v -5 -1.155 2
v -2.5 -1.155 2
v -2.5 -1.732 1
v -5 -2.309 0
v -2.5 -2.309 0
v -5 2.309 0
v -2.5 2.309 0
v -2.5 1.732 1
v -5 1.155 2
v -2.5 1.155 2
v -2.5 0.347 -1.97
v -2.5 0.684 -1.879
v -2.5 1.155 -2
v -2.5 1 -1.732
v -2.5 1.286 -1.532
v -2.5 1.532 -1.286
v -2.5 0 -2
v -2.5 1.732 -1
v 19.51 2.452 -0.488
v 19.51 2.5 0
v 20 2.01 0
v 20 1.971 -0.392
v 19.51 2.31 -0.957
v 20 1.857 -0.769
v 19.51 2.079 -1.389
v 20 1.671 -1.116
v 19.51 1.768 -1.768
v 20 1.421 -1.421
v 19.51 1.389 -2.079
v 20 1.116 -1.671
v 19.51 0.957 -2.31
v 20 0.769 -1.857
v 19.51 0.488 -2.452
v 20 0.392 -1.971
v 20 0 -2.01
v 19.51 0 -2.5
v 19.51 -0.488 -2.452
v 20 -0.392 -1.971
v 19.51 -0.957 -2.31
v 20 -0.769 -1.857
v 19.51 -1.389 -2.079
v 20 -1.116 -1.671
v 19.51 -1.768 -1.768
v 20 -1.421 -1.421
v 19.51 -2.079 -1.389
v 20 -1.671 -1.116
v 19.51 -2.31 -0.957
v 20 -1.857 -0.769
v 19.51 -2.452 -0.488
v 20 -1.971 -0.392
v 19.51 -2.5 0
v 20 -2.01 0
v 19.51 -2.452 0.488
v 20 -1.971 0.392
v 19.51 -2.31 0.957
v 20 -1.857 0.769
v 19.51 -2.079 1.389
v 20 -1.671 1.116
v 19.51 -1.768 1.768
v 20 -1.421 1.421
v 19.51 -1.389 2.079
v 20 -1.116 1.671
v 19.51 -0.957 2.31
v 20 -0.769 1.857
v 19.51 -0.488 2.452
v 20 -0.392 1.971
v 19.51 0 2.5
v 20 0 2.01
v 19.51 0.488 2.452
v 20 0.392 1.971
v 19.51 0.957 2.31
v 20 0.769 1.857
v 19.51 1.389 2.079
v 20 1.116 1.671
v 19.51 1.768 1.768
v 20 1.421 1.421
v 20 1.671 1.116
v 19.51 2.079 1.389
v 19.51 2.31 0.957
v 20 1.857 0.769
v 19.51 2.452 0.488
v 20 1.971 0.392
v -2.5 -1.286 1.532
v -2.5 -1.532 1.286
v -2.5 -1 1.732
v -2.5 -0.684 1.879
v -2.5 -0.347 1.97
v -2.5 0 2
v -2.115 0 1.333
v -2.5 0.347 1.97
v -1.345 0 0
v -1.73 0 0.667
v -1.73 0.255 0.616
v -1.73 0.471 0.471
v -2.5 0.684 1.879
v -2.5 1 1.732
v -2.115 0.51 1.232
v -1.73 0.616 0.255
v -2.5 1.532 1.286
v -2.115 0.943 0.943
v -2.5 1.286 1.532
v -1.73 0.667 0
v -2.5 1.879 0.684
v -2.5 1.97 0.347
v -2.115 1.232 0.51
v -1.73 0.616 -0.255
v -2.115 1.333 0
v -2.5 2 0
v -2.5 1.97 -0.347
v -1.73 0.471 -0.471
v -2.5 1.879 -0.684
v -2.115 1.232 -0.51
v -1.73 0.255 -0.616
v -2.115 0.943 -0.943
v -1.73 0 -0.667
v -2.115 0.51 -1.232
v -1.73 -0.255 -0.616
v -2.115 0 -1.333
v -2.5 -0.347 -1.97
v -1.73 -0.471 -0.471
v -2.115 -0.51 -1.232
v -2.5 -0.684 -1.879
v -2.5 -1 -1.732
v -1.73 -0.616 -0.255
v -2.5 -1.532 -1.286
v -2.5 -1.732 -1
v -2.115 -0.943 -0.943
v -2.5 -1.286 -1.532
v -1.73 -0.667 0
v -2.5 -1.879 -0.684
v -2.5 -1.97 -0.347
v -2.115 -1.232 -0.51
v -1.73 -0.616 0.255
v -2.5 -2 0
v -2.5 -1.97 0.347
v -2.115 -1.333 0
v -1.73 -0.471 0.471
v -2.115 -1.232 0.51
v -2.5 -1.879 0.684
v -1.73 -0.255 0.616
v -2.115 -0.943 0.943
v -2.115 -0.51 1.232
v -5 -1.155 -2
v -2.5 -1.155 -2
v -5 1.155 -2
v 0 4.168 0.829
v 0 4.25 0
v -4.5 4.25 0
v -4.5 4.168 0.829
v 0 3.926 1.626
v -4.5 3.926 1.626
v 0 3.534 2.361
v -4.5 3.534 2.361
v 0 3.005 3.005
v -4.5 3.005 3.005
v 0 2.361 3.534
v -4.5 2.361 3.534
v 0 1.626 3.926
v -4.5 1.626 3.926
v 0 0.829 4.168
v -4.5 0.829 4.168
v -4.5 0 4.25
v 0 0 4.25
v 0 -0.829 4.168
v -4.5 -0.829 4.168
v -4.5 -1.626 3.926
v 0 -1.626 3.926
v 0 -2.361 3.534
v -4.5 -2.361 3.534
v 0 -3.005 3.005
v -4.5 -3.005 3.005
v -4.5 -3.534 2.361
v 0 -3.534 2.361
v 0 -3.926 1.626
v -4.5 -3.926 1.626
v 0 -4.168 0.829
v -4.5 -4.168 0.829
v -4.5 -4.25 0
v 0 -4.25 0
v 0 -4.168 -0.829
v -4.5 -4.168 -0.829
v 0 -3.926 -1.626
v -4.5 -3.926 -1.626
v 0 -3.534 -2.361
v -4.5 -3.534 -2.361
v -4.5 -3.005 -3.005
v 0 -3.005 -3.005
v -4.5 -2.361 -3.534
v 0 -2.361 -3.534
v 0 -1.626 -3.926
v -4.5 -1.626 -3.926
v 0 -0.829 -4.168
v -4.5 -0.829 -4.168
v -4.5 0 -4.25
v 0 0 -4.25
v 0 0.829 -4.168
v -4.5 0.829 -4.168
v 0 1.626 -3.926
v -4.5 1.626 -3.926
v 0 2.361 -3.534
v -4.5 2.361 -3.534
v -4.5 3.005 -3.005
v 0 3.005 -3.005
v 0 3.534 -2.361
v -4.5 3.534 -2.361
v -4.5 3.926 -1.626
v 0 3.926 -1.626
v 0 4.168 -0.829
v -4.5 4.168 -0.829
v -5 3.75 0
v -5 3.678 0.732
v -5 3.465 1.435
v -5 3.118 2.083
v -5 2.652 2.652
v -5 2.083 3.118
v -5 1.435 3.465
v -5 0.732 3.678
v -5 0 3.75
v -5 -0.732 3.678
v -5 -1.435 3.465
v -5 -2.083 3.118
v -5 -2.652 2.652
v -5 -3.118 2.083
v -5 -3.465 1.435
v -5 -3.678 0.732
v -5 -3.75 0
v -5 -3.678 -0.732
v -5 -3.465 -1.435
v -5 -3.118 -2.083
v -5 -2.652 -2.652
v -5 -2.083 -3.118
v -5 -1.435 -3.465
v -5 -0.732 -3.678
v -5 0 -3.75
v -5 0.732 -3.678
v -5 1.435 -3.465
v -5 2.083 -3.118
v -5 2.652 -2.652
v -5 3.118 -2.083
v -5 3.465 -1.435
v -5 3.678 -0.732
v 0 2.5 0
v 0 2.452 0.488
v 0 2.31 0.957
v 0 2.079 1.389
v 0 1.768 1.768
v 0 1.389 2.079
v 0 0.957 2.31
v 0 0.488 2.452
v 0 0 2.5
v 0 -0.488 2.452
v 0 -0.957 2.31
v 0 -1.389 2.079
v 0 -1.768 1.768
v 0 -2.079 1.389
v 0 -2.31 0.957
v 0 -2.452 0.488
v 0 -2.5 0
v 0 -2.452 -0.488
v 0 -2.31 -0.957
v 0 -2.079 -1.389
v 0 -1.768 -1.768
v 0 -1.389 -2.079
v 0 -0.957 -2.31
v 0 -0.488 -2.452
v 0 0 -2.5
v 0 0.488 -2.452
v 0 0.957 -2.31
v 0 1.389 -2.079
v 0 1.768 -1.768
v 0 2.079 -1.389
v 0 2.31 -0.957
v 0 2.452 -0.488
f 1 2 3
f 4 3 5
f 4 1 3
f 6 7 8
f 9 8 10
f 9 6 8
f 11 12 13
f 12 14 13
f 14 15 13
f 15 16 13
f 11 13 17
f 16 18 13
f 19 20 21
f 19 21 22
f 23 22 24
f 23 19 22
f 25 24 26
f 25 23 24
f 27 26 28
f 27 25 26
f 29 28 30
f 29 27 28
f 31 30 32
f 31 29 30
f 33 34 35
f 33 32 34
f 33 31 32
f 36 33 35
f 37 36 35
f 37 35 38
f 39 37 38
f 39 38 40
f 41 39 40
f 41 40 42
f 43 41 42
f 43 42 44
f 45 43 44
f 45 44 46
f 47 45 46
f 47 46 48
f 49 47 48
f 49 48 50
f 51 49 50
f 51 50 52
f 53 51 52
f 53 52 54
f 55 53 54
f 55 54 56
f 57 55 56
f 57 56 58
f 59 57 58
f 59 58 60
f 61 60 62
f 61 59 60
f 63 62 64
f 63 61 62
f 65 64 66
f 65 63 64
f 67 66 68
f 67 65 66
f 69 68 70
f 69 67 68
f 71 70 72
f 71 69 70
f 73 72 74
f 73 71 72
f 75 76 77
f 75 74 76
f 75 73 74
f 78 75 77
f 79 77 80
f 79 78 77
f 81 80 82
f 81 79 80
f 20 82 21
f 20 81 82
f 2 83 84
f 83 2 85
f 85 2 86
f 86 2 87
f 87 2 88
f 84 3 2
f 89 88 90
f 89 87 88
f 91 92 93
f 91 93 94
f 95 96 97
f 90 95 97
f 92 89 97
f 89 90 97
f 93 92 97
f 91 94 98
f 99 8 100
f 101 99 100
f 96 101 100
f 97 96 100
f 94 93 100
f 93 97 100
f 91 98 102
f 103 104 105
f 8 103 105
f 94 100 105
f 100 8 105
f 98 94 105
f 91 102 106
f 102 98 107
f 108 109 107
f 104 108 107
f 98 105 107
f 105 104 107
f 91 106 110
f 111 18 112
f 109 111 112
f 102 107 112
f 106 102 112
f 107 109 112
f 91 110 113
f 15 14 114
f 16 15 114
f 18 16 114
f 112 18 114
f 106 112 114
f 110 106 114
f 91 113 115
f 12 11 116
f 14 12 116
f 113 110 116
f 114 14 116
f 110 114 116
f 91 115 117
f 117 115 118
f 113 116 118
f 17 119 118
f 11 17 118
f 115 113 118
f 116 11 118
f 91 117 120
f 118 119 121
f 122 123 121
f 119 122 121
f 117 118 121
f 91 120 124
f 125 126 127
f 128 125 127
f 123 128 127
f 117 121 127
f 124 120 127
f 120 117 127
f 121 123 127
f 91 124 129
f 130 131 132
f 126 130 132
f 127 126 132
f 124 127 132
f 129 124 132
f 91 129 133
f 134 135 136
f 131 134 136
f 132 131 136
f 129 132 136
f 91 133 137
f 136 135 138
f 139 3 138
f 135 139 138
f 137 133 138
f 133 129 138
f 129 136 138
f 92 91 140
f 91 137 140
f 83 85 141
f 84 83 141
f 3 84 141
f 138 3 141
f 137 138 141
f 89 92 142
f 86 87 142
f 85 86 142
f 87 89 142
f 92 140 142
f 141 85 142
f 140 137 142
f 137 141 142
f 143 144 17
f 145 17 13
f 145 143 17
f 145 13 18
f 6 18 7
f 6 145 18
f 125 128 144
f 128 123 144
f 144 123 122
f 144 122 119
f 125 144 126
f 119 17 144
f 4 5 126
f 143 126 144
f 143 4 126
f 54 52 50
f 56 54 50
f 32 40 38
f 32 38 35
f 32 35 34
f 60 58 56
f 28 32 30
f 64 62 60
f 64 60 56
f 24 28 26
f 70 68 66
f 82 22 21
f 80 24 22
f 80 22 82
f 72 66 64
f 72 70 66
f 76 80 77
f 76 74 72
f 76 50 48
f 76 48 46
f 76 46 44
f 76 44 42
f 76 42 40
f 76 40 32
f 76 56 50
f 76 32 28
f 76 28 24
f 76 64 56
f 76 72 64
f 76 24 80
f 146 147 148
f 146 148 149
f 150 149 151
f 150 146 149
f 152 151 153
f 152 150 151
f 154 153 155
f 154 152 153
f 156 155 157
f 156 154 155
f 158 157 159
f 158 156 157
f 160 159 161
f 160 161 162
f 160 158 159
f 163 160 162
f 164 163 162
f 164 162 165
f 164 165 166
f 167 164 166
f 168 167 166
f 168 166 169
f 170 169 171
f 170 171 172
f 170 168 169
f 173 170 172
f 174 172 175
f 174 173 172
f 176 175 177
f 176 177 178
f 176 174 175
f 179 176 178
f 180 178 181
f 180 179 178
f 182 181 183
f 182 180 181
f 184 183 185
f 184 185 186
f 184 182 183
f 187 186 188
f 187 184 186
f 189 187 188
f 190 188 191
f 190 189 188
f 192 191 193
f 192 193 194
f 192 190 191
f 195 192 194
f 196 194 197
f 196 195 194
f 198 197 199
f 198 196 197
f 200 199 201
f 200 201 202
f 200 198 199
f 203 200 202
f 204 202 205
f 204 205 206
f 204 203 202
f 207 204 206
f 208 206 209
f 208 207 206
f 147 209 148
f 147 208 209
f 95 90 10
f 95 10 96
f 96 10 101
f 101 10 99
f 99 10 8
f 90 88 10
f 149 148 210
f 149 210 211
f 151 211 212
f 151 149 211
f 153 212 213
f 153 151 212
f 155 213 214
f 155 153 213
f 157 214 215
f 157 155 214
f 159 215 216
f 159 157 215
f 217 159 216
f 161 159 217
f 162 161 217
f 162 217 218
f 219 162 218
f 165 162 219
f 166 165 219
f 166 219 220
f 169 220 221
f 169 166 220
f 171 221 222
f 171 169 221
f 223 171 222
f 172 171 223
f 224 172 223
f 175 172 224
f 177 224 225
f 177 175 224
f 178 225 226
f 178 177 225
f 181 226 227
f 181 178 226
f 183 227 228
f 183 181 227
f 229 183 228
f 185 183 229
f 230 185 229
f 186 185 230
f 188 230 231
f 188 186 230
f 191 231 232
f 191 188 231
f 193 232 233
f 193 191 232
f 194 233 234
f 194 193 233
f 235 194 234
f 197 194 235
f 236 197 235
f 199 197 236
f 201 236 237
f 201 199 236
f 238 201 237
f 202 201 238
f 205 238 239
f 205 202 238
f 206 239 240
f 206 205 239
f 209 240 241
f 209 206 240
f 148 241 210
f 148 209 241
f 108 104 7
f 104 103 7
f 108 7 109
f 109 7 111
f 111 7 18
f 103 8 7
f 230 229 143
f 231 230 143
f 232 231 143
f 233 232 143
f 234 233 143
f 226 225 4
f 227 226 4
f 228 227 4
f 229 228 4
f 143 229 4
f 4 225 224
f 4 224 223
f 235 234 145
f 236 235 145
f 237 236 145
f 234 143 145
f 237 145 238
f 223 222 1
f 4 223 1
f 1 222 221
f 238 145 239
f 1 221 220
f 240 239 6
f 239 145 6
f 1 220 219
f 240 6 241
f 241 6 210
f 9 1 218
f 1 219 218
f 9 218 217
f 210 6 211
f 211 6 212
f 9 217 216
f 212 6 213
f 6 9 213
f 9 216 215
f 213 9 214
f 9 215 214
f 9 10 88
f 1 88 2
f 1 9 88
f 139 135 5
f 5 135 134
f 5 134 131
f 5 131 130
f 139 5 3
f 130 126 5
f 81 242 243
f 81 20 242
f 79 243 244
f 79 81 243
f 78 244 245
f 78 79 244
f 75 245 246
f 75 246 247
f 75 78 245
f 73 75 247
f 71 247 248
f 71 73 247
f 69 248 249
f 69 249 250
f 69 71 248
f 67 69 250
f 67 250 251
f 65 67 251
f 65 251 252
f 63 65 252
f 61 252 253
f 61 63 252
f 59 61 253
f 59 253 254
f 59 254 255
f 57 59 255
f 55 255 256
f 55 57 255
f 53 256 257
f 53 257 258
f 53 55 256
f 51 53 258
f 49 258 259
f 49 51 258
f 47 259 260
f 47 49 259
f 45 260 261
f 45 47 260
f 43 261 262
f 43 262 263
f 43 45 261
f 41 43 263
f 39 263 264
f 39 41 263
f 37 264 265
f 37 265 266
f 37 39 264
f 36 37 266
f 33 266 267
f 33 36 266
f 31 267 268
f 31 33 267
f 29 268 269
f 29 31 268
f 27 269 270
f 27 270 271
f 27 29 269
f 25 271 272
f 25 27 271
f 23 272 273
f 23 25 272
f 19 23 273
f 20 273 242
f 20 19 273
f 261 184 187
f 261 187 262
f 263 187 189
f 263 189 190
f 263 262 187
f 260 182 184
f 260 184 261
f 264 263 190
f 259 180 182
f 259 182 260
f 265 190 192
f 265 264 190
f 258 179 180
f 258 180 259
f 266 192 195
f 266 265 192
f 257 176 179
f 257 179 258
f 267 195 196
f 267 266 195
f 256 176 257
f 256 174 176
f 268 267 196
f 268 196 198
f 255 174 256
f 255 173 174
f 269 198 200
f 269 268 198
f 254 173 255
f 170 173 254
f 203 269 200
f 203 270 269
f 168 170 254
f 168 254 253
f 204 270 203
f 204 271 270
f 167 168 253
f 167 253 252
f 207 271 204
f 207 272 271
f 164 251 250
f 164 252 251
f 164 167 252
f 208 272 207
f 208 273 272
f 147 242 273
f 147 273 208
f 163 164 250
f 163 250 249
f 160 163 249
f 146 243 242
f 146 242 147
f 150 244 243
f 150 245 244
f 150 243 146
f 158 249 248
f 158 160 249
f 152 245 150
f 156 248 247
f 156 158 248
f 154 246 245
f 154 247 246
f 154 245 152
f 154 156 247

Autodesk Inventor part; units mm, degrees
sketch "Sketch_1" plane through (0, 0, 0) normal (0, 0, 1) x (1, 0, 0)
  line L0 (20, 0) -> (-5, 0)
  line L1 (-5, 0) -> (-5, 3.75)
  line L2 (-5, 3.75) -> (-4.5, 4.25)
  line L3 (-4.5, 4.25) -> (0, 4.25)
  line L4 (0, 4.25) -> (0, 2.5)
  line L5 (0, 2.5) -> (19.5095, 2.5)
  line L6 (19.5095, 2.5) -> (20, 2.0095)
  line L7 (20, 2.0095) -> (20, 0)
  line L8 (20, 0) -> (-5, 0)
revolve "Revolution1" add sketch "Sketch_1" angle 360 about axis through (20, 0, 0) along (1, 0, 0)
thread "Thread1" size "M5x0.8" class "6g" standard "ISO Metric profile" length 19.2 offset 0.8
sketch "Sketch2" plane through (-5, 0, 0) normal (-1, 0, 0) x (0, 0, 1)
  point P0 (0, 0)
hole "Hole1" at (-5, 0, 0) direction (1, 0, 0) diameter 4 depth 2.5 tip angle 120
sketch "Sketch_3" plane through (-5, 0, 0) normal (1, 0, 0) x (0, 0, -1)
  line L0 (-2, -1.1547) -> (0, -2.3094)
  line L1 (0, -2.3094) -> (2, -1.1547)
  line L2 (2, -1.1547) -> (2, 1.1547)
  line L3 (2, 1.1547) -> (0, 2.3094)
  line L4 (0, 2.3094) -> (-2, 1.1547)
  line L5 (-2, 1.1547) -> (-2, -1.1547)
extrude "Extrusion1" cut sketch "Sketch_3" along normal blind 2.5
ref_plane "bolt_XY" through (20, 0, 0) normal (1, 0, 0) x (0, 0, -1)
ref_plane "bolt_YZ" through (20, 0, 0) normal (0, 0, -1) x (0, 1, 0)
ref_plane "bolt_ZX" through (20, 0, 0) normal (0, 1, 0) x (1, 0, 0)
ref_plane "nut_XY" through (0, 0, 0) normal (1, 0, 0) x (0, 0, -1)
ref_plane "nut_YZ" through (0, 0, 0) normal (0, 0, -1) x (0, 1, 0)
ref_plane "nut_ZX" through (0, 0, 0) normal (0, 1, 0) x (1, 0, 0)
properties part number "CBE5-20"
